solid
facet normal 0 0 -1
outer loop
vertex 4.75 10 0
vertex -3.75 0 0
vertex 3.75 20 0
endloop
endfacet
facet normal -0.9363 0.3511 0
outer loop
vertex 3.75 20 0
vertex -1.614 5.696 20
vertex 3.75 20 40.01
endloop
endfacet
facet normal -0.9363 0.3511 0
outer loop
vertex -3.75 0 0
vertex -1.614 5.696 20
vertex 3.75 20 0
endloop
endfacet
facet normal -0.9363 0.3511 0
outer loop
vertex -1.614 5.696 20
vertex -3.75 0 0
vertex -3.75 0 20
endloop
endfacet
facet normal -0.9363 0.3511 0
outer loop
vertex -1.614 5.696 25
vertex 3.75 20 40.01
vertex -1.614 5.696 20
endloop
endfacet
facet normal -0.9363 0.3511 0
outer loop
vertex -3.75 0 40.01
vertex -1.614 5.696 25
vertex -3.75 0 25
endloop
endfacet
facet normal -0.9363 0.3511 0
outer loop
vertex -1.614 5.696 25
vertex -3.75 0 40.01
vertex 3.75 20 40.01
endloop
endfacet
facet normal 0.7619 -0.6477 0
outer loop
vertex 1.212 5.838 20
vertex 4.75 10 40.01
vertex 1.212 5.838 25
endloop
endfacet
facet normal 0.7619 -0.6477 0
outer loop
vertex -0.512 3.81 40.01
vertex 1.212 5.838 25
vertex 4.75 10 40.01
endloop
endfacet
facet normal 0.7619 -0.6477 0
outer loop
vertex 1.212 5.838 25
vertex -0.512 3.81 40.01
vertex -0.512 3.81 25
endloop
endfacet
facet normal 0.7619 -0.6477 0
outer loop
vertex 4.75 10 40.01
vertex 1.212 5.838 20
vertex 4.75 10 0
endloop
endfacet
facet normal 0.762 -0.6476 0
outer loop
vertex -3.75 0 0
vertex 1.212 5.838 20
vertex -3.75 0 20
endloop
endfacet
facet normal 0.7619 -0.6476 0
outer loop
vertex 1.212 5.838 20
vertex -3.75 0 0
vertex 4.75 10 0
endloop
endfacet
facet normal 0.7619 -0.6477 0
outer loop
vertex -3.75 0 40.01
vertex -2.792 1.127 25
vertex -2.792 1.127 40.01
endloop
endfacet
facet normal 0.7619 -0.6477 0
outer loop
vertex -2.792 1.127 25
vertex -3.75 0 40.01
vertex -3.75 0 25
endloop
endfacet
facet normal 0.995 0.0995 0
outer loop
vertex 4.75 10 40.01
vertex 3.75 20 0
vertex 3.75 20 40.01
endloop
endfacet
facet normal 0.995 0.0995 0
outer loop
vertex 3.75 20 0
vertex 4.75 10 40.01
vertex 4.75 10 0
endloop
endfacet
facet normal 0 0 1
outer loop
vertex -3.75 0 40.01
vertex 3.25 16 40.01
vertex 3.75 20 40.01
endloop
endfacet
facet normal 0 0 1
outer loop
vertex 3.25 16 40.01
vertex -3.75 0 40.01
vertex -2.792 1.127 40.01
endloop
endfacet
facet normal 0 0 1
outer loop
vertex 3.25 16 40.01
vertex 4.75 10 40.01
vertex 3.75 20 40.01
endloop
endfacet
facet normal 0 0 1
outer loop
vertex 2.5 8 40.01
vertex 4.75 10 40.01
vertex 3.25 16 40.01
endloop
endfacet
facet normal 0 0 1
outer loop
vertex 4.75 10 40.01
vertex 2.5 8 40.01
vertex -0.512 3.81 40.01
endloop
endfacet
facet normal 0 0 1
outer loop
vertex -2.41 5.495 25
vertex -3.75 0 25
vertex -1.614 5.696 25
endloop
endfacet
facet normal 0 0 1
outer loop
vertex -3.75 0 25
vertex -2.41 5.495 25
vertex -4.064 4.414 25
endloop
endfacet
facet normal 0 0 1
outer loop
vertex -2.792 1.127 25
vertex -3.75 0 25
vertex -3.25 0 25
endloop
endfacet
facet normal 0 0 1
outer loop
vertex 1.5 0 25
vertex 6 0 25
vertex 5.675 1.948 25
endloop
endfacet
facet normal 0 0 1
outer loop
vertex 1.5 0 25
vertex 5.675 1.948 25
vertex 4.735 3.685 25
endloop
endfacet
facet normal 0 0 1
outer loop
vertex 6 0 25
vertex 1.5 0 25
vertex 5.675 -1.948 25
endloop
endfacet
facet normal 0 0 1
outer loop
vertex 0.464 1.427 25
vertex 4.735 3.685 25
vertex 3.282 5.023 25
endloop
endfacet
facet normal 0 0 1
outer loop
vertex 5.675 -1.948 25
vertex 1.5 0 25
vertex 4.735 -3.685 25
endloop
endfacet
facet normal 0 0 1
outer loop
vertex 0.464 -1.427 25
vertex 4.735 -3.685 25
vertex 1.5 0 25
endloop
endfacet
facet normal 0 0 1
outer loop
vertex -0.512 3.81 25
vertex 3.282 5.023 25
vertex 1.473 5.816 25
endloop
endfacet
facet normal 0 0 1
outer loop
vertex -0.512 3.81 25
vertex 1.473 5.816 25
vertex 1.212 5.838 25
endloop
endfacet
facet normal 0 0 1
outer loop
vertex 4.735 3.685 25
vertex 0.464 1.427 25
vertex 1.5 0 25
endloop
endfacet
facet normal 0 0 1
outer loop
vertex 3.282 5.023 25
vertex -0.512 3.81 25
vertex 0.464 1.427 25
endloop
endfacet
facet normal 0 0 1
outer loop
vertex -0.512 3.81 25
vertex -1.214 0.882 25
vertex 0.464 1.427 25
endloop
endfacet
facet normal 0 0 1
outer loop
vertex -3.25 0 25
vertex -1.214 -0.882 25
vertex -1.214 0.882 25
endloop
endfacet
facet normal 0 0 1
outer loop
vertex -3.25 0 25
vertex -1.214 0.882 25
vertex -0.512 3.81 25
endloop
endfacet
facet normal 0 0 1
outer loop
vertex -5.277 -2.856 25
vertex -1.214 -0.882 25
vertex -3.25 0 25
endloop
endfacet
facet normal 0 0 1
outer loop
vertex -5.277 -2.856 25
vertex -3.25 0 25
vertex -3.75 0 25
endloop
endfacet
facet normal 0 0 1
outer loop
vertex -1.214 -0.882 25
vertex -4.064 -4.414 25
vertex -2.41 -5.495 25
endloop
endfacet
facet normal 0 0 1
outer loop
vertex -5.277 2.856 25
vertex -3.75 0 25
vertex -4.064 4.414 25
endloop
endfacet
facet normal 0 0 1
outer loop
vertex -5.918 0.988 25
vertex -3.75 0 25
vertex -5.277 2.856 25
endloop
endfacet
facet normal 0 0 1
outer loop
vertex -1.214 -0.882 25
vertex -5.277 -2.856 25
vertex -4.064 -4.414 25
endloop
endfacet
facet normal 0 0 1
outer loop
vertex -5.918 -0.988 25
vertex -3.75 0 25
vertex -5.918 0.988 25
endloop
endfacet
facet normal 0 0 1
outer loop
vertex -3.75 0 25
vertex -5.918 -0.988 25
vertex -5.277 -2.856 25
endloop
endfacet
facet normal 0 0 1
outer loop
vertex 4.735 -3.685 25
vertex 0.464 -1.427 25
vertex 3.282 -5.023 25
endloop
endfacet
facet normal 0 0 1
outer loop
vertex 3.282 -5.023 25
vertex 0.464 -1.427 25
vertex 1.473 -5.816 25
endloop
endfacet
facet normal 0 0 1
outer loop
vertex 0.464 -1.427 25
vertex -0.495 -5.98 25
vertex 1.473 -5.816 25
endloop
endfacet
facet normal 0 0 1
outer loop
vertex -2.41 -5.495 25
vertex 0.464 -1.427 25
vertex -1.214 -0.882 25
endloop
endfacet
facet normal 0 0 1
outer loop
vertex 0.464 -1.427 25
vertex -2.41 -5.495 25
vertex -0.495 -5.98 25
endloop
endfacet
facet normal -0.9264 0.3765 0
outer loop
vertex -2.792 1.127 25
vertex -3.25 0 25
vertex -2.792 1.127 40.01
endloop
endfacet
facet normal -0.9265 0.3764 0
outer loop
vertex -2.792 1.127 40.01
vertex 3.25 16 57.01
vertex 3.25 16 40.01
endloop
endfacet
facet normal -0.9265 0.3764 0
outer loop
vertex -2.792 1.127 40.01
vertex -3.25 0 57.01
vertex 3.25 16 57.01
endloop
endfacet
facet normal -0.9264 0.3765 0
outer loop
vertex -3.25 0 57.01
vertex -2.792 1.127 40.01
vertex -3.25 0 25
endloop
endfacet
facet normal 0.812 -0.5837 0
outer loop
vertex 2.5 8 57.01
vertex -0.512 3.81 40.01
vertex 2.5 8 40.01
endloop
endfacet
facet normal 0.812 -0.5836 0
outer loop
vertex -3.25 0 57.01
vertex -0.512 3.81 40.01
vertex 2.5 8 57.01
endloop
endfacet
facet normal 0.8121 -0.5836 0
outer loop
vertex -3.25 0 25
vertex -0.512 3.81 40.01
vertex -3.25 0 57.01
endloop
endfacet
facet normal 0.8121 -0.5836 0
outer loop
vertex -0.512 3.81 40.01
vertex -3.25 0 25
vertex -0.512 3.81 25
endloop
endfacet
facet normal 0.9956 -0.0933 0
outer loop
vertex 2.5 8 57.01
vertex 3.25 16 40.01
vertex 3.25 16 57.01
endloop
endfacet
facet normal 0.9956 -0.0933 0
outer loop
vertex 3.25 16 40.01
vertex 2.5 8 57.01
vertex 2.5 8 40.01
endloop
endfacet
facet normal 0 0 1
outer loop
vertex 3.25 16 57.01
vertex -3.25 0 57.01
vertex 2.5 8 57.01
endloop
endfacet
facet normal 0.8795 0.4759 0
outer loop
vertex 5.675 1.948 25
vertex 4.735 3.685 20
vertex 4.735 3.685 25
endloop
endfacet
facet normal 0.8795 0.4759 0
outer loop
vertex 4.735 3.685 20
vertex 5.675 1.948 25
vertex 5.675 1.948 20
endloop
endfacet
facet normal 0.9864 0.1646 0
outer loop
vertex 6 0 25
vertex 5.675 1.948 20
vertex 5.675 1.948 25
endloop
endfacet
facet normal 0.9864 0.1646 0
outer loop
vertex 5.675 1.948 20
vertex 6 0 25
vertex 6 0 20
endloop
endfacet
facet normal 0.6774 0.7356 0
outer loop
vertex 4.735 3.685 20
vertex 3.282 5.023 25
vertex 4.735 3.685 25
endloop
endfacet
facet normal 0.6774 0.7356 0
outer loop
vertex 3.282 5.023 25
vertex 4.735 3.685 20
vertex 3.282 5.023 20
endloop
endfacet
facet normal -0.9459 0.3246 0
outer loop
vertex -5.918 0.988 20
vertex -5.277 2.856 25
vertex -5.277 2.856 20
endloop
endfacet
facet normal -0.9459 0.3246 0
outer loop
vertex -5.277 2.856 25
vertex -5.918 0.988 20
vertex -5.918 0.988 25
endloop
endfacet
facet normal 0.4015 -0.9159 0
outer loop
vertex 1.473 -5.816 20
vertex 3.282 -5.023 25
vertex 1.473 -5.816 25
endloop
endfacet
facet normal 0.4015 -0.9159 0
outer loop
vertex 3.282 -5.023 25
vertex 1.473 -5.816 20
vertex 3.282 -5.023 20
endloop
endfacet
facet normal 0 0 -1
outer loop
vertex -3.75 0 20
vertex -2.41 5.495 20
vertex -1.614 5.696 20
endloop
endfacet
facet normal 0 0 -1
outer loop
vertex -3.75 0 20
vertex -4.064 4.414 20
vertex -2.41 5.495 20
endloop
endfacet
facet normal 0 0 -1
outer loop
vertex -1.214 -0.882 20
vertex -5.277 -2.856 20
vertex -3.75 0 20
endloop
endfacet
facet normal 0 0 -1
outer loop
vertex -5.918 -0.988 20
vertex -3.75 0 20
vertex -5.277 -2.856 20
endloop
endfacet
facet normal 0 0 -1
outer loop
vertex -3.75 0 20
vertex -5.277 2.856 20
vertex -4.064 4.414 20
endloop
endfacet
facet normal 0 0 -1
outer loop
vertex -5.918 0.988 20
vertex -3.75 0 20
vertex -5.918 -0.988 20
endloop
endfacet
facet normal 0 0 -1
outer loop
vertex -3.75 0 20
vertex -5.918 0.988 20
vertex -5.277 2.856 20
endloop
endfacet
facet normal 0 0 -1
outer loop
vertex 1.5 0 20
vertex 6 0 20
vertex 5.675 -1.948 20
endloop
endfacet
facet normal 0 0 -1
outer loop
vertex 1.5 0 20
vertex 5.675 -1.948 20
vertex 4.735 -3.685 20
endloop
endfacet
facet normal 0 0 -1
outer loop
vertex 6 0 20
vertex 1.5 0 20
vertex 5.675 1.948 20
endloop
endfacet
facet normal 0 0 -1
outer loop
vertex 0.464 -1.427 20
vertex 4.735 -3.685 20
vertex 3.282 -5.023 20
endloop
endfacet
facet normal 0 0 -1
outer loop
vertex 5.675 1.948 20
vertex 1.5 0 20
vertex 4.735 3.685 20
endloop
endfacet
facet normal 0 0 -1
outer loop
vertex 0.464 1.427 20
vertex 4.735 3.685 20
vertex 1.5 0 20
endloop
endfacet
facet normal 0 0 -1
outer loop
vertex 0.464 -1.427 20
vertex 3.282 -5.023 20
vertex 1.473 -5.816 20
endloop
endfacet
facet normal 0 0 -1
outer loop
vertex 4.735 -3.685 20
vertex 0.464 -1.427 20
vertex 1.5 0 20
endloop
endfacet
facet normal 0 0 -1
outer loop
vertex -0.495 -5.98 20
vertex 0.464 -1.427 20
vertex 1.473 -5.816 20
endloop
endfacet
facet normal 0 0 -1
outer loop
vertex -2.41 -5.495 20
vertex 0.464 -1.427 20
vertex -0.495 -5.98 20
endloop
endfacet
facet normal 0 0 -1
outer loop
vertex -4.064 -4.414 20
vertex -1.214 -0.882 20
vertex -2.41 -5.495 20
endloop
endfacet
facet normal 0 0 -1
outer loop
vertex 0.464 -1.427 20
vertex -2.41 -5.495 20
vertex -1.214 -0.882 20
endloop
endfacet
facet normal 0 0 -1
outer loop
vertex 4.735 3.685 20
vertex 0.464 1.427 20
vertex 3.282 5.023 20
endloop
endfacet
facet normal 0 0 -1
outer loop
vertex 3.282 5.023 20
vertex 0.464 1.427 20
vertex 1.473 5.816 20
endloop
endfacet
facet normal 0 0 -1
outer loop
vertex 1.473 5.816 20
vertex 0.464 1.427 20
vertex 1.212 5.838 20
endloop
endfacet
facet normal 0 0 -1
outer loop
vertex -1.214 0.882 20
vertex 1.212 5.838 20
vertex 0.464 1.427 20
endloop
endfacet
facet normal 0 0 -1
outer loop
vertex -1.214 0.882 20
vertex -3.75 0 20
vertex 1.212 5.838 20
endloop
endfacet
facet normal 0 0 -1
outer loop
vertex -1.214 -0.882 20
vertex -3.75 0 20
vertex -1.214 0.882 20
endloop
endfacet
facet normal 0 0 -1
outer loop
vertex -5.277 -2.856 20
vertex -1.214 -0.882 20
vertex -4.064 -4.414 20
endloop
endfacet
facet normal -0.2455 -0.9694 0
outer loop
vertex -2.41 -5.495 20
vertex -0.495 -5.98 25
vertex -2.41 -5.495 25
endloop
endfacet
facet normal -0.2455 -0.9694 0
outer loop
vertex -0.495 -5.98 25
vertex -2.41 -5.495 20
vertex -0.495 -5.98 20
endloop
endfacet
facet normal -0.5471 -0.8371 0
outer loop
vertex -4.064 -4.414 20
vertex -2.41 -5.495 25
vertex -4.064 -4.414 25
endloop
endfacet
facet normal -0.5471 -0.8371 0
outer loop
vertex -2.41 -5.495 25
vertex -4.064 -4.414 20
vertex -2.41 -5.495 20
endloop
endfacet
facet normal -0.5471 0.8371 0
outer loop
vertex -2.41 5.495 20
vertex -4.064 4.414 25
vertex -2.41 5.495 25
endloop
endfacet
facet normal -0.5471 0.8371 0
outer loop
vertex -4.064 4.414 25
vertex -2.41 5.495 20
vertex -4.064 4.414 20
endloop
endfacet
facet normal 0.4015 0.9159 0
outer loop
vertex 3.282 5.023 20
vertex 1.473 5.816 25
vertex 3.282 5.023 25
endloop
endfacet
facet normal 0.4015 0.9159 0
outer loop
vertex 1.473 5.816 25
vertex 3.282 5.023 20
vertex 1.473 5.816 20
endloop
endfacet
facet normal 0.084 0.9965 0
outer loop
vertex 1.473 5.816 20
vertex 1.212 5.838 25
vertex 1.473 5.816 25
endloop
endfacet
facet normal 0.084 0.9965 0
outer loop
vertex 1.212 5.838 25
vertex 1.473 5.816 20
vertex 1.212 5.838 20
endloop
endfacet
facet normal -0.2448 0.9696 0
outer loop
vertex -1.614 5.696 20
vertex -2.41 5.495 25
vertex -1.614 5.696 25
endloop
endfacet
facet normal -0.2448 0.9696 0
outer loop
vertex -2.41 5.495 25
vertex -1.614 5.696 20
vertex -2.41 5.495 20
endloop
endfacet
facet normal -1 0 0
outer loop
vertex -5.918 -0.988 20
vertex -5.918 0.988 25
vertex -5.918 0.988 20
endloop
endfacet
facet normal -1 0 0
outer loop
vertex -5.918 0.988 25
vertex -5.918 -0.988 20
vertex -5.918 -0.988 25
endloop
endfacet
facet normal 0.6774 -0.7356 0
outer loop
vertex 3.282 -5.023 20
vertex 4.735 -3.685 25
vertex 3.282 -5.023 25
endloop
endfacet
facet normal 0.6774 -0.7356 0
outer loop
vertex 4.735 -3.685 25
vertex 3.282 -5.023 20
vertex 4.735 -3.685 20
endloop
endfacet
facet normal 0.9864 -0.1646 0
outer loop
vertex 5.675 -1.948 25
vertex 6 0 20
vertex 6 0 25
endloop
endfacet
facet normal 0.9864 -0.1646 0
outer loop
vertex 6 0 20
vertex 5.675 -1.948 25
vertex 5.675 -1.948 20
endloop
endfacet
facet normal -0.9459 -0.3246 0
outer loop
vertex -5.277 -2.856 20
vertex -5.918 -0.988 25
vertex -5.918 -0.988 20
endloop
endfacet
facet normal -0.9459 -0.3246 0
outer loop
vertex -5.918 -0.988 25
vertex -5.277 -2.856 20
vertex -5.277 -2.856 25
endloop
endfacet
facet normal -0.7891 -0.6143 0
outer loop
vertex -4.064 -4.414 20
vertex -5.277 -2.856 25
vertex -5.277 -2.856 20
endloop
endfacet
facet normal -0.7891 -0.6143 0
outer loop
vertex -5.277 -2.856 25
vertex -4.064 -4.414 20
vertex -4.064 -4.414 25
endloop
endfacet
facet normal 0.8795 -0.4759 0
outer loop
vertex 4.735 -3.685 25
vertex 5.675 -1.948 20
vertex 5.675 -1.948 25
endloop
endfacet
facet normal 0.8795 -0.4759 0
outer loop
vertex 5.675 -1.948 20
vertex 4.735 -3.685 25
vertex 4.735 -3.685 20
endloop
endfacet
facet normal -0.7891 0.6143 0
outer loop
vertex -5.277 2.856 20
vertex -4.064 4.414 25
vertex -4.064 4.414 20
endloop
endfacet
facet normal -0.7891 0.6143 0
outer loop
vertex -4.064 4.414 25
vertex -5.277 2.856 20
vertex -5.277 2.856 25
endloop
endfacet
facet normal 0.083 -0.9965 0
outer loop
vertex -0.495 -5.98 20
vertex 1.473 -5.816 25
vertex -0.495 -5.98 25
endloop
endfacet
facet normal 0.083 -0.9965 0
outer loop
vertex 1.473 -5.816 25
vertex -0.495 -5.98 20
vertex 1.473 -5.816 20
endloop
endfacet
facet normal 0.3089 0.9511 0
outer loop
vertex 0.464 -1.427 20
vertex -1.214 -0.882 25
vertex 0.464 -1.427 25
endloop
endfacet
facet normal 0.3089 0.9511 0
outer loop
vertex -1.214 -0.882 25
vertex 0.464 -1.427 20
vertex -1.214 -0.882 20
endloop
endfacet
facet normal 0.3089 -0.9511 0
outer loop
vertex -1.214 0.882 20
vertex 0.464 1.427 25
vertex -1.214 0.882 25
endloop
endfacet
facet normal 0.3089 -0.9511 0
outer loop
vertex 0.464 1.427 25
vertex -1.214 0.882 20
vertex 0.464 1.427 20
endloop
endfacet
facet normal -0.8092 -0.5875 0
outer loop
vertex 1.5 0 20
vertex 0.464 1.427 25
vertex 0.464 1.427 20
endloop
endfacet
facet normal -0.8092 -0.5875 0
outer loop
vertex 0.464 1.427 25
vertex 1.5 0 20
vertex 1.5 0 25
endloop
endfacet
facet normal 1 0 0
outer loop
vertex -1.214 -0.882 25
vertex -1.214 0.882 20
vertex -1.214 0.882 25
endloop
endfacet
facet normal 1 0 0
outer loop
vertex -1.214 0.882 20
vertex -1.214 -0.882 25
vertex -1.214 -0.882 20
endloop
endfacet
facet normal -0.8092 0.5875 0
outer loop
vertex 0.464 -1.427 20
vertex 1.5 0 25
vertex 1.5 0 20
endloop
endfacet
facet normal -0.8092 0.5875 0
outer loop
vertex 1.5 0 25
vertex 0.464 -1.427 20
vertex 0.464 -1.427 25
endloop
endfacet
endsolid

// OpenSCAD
// Hose-barb reducer: 8 mm tubing (barbs) -> 5 mm tubing (barbs)
// Print orientation: standing upright along Z, centred on origin in X/Y

// ---------------- Parameters ----------------
bore      = 3;    // through-bore diameter (mm)
eps       = 0.5;  // cutter overshoot past faces (mm)

// Lower section (z = 0 .. 20): 8 mm tubing barbs
z_barb_a  = 20;   // height of lower barbs (mm)
d_barb_a  = 7.5;  // outer diameter of lower barbs at bottom (mm)
d_barb_t  = 9.5;  // outer diameter of lower barbs at top (mm)
n_barb_a  = 2;    // number of lower barbs, stacked

// Collar (z = 20 .. 25)
z_collar  = 5;    // collar thickness (mm)
d_collar  = 12;   // collar outer diameter (mm)

// Upper section (z = 25 .. 41): 5 mm tubing barbs
z_barb_b  = 16;   // height of upper barbs (mm)
d_barb_c  = 6.5;  // outer diameter of upper barbs at bottom (mm)
d_barb_d  = 5.0;  // outer diameter of upper barbs at top (mm)
n_barb_b  = 2;    // number of upper barbs, stacked

total_h   = z_barb_a + z_collar + z_barb_b;  // 41 mm overall

// ---------------- Model ----------------
difference() {
    union() {
        // Lower barbs: sawtooth profile, extended above collar for a clean union
        for (i = [0 : n_barb_a - 1])
            translate([0, 0, i * z_barb_a / (n_barb_a - 1)])
                linear_extrude(height = z_barb_a + 0.01)
                    polygon(points = [
                        [-d_barb_a / 2, 0],
                        [ d_barb_t / 2, z_barb_a * 0.5],
                        [ d_barb_a / 2, z_barb_a]
                    ]);

        // Collar
        translate([0, 0, z_barb_a])
            cylinder(h = z_collar, d = d_collar);

        // Upper barbs: sawtooth profile, extended below collar for a clean union
        for (i = [0 : n_barb_b - 1])
            translate([0, 0, z_barb_a + z_collar + i * z_barb_b / (n_barb_b - 1)])
                linear_extrude(height = z_barb_b + 0.01)
                    polygon(points = [
                        [-d_barb_c / 2, 0],
                        [ d_barb_d / 2, z_barb_b * 0.5],
                        [ d_barb_c / 2, z_barb_b]
                    ]);
    }

    // Through-bore
    translate([0, 0, -eps])
        cylinder(h = total_h + 2 * eps, d = bore);
}
